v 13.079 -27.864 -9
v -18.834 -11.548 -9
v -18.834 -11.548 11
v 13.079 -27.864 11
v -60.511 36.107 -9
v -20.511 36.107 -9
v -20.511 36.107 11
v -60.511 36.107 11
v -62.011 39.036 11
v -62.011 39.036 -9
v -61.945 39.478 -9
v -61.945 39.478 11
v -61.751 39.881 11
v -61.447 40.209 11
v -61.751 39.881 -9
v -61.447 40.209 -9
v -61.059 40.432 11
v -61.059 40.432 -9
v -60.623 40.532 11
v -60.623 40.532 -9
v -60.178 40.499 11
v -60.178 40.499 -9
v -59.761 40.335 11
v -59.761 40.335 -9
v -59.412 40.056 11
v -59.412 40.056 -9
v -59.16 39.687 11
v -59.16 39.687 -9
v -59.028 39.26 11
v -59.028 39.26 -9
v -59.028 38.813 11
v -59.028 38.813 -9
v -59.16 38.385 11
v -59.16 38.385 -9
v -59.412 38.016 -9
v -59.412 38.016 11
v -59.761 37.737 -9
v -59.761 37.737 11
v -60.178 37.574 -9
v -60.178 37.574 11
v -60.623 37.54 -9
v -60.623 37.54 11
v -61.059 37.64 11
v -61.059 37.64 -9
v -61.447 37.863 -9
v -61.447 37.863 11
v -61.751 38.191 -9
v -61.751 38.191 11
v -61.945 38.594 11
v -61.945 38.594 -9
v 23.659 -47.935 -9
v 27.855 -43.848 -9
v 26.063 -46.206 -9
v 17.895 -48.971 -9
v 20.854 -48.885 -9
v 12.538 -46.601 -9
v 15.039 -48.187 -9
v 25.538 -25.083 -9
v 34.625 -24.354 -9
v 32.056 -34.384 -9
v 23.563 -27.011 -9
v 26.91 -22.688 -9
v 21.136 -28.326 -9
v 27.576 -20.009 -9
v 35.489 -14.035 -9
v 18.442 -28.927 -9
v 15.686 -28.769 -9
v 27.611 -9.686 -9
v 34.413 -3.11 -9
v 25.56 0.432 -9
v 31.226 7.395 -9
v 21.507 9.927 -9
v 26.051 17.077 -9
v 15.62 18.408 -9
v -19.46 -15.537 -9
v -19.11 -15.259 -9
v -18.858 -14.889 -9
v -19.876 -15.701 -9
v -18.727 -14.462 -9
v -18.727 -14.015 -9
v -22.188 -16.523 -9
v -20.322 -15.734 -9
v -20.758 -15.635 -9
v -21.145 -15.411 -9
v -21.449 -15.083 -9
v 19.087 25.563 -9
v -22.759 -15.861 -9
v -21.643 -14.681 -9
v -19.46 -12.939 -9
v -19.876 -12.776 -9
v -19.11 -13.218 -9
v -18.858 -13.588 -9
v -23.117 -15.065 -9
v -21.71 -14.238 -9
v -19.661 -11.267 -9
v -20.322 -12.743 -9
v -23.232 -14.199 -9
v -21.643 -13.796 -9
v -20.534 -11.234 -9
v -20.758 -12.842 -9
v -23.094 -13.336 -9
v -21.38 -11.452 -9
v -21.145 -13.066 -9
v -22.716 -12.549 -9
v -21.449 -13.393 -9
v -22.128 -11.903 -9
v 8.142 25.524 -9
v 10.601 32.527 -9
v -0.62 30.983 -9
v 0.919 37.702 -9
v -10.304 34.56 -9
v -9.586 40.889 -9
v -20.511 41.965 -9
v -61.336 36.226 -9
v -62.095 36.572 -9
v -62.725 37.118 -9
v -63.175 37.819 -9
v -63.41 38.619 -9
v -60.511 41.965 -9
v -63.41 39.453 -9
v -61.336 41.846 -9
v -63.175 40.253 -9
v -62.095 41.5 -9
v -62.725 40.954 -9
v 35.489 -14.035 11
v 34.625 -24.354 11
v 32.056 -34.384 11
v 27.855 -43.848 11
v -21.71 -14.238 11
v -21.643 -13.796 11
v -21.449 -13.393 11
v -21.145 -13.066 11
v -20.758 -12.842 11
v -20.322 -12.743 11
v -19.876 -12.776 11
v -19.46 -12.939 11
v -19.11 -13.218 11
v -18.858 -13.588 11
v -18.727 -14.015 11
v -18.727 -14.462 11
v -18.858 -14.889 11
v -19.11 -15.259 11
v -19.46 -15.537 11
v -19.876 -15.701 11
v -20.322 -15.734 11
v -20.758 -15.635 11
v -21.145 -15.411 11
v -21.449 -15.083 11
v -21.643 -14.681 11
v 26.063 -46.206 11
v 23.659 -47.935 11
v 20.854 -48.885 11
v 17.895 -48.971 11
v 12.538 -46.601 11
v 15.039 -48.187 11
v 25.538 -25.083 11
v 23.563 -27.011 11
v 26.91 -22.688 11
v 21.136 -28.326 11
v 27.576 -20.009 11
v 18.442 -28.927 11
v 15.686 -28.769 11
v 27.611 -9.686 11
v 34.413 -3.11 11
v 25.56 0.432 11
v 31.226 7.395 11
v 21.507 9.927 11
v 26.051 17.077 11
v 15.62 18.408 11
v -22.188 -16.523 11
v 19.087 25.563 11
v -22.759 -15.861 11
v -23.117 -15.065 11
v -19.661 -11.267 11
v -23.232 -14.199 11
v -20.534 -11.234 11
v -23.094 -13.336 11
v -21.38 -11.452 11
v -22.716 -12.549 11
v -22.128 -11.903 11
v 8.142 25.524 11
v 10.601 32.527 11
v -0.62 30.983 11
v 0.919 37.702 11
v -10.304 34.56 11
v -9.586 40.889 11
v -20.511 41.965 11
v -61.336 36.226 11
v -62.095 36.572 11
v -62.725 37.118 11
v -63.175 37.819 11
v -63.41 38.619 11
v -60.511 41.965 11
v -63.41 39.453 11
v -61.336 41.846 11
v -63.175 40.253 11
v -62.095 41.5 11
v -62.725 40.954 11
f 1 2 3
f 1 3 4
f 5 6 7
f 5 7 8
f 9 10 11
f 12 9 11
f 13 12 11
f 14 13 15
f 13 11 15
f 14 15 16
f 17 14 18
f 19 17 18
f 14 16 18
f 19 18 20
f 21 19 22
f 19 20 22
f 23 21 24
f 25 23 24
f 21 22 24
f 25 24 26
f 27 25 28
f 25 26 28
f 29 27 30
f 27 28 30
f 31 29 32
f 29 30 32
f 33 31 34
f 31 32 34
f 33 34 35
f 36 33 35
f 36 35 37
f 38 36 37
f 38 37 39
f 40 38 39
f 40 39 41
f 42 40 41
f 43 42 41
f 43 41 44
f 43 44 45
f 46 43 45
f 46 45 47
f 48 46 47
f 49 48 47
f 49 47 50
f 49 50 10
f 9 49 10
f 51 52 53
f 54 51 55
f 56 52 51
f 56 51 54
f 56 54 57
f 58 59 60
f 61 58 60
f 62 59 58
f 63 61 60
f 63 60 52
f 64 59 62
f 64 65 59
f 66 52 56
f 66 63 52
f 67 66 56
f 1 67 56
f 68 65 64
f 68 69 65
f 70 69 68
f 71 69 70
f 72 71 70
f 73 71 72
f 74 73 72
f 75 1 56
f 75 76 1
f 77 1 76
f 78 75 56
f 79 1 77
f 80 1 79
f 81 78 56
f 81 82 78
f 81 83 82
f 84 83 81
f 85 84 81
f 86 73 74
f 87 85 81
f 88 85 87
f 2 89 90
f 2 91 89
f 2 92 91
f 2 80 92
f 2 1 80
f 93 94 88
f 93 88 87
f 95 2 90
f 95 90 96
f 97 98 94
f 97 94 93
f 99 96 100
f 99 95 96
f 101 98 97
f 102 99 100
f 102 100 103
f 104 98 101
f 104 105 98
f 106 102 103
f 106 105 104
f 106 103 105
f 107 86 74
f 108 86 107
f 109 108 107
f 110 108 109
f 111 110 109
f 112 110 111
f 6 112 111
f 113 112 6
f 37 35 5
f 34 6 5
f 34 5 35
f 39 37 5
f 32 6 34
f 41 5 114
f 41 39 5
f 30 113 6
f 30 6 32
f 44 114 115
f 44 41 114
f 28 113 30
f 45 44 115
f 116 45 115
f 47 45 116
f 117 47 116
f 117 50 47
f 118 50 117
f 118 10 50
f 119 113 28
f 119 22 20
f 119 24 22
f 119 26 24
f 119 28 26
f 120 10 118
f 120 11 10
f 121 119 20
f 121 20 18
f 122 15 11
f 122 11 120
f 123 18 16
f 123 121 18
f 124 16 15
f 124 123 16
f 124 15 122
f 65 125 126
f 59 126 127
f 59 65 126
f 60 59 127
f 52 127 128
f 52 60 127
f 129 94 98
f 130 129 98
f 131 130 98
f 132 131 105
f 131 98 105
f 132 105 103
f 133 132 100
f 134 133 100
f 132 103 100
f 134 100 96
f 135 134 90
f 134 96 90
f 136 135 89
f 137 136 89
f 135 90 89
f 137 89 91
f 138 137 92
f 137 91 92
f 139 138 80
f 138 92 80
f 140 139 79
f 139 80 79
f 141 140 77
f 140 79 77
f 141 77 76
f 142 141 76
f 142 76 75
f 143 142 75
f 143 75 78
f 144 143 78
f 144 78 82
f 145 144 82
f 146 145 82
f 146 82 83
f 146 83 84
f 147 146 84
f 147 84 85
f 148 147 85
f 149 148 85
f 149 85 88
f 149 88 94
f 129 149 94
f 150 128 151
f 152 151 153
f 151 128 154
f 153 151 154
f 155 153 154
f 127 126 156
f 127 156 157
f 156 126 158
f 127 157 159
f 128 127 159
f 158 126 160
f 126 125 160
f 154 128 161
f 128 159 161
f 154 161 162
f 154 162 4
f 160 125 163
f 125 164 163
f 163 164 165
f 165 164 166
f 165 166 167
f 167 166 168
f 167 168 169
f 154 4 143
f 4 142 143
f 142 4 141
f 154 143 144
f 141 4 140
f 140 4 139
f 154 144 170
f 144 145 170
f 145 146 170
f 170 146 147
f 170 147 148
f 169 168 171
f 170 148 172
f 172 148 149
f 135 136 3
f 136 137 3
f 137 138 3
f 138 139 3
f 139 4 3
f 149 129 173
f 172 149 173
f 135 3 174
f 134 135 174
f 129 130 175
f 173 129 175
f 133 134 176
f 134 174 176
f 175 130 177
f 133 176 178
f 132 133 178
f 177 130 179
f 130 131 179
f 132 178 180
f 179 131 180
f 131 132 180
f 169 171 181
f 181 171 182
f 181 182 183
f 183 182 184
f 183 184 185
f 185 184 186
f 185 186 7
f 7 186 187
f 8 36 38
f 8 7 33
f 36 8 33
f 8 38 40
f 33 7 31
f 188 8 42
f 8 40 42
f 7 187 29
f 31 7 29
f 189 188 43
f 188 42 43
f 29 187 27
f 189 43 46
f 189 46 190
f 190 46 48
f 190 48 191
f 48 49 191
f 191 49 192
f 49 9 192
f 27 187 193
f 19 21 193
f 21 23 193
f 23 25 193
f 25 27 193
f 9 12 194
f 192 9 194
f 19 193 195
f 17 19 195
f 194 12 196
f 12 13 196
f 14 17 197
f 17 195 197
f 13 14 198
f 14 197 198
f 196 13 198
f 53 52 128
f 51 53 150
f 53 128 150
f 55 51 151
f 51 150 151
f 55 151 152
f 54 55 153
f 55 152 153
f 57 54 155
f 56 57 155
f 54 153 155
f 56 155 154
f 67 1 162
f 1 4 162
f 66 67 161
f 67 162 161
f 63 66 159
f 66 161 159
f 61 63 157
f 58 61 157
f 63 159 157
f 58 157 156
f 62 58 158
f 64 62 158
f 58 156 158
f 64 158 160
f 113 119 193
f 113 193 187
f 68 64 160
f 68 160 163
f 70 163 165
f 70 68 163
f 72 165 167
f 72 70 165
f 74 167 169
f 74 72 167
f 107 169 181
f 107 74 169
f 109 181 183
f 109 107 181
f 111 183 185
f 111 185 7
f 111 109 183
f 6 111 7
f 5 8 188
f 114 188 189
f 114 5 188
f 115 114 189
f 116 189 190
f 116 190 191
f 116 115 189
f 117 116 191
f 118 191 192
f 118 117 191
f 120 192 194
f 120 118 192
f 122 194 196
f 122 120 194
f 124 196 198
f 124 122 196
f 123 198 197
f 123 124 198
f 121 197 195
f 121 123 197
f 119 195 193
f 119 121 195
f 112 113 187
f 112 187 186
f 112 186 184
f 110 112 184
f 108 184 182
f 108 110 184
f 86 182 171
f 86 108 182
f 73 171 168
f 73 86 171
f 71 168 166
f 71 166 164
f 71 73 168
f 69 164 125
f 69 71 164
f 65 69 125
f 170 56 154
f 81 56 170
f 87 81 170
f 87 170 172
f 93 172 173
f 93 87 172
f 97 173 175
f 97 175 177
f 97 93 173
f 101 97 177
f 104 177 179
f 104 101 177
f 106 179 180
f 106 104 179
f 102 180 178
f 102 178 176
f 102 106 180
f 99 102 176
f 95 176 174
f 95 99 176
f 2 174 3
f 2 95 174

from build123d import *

# Parameters (mm, degrees)
BOSS_EXTRUDE1_DEPTH = 2
SKETCH2_R           = 0.15
CUT_EXTRUDE1_DEPTH  = 3
SKETCH3_R           = 0.15
CUT_EXTRUDE4_DEPTH  = 3
FILLET2_R           = 1
FILLET3_R           = 1
SCALE2_SCALE        = 10


with BuildPart() as part:
    # Sketch1 → Boss-Extrude1 (new body)
    with BuildSketch(Plane.XY):
        with BuildLine():
            Line((-1.517184845, 0.342990579), (2.482815155, 0.342990579))
            ThreePointArc((2.482815155, 0.342990579), (6.442613129, -1.297211446), (8.082815155, -5.257009421))
            ThreePointArc((8.082815155, -5.257009421), (7.70871156, -7.378656338), (6.631523189, -9.244401325))
            Line((6.631523189, -9.244401325), (2.315107728, -5.50575471))
            ThreePointArc((2.315107728, -5.50575471), (2.262391387, -5.108396746), (2.650522581, -5.008264131))
            Line((2.650522581, -5.008264131), (6.955903492, -7.209487065))
            ThreePointArc((6.955903492, -7.209487065), (6.513613709, -2.574091852), (2.482815155, -0.242746306))
            Line((2.482815155, -0.242746306), (-1.517184845, -0.242746306))
            ThreePointArc((-1.517184845, -0.242746306), (-1.810053288, 0.050122136), (-1.517184845, 0.342990579))
        make_face()
    extrude(amount=BOSS_EXTRUDE1_DEPTH)

    # Sketch2 → Cut-Extrude1 (cut, through all)
    with BuildSketch(Plane(origin=(0, 0, 0), x_dir=(-1, 0, 0), z_dir=(0, 0, -1))):
        with Locations((-2.512956146, -5.277330883)):
            Circle(SKETCH2_R)
    extrude(amount=-CUT_EXTRUDE1_DEPTH, mode=Mode.SUBTRACT)

    # Sketch3 → Cut-Extrude4 (cut, through all)
    with BuildSketch(Plane(origin=(0, 0, 0), x_dir=(-1, 0, 0), z_dir=(0, 0, -1))):
        with Locations((1.517184845, 0.050122136)):
            Circle(SKETCH3_R)
    extrude(amount=-CUT_EXTRUDE4_DEPTH, mode=Mode.SUBTRACT)

    # Fillet2
    fillet2_edges = [part.edges().sort_by_distance(p)[0] for p in [
        (6.631523189, -9.244401325, 1),
    ]]
    fillet(fillet2_edges, radius=FILLET2_R)

    # Fillet3
    fillet3_edges = [part.edges().sort_by_distance(p)[0] for p in [
        (6.955903492, -7.209487065, 1),
    ]]
    fillet(fillet3_edges, radius=FILLET3_R)


with BuildPart() as part_1:
    # Scale2: scaled about (5.037716687, -4.281654958, 1)
    add(part.part.scale(SCALE2_SCALE).moved(Location((-45.339450183, 38.534894622, -9))))


solid = part_1.part
